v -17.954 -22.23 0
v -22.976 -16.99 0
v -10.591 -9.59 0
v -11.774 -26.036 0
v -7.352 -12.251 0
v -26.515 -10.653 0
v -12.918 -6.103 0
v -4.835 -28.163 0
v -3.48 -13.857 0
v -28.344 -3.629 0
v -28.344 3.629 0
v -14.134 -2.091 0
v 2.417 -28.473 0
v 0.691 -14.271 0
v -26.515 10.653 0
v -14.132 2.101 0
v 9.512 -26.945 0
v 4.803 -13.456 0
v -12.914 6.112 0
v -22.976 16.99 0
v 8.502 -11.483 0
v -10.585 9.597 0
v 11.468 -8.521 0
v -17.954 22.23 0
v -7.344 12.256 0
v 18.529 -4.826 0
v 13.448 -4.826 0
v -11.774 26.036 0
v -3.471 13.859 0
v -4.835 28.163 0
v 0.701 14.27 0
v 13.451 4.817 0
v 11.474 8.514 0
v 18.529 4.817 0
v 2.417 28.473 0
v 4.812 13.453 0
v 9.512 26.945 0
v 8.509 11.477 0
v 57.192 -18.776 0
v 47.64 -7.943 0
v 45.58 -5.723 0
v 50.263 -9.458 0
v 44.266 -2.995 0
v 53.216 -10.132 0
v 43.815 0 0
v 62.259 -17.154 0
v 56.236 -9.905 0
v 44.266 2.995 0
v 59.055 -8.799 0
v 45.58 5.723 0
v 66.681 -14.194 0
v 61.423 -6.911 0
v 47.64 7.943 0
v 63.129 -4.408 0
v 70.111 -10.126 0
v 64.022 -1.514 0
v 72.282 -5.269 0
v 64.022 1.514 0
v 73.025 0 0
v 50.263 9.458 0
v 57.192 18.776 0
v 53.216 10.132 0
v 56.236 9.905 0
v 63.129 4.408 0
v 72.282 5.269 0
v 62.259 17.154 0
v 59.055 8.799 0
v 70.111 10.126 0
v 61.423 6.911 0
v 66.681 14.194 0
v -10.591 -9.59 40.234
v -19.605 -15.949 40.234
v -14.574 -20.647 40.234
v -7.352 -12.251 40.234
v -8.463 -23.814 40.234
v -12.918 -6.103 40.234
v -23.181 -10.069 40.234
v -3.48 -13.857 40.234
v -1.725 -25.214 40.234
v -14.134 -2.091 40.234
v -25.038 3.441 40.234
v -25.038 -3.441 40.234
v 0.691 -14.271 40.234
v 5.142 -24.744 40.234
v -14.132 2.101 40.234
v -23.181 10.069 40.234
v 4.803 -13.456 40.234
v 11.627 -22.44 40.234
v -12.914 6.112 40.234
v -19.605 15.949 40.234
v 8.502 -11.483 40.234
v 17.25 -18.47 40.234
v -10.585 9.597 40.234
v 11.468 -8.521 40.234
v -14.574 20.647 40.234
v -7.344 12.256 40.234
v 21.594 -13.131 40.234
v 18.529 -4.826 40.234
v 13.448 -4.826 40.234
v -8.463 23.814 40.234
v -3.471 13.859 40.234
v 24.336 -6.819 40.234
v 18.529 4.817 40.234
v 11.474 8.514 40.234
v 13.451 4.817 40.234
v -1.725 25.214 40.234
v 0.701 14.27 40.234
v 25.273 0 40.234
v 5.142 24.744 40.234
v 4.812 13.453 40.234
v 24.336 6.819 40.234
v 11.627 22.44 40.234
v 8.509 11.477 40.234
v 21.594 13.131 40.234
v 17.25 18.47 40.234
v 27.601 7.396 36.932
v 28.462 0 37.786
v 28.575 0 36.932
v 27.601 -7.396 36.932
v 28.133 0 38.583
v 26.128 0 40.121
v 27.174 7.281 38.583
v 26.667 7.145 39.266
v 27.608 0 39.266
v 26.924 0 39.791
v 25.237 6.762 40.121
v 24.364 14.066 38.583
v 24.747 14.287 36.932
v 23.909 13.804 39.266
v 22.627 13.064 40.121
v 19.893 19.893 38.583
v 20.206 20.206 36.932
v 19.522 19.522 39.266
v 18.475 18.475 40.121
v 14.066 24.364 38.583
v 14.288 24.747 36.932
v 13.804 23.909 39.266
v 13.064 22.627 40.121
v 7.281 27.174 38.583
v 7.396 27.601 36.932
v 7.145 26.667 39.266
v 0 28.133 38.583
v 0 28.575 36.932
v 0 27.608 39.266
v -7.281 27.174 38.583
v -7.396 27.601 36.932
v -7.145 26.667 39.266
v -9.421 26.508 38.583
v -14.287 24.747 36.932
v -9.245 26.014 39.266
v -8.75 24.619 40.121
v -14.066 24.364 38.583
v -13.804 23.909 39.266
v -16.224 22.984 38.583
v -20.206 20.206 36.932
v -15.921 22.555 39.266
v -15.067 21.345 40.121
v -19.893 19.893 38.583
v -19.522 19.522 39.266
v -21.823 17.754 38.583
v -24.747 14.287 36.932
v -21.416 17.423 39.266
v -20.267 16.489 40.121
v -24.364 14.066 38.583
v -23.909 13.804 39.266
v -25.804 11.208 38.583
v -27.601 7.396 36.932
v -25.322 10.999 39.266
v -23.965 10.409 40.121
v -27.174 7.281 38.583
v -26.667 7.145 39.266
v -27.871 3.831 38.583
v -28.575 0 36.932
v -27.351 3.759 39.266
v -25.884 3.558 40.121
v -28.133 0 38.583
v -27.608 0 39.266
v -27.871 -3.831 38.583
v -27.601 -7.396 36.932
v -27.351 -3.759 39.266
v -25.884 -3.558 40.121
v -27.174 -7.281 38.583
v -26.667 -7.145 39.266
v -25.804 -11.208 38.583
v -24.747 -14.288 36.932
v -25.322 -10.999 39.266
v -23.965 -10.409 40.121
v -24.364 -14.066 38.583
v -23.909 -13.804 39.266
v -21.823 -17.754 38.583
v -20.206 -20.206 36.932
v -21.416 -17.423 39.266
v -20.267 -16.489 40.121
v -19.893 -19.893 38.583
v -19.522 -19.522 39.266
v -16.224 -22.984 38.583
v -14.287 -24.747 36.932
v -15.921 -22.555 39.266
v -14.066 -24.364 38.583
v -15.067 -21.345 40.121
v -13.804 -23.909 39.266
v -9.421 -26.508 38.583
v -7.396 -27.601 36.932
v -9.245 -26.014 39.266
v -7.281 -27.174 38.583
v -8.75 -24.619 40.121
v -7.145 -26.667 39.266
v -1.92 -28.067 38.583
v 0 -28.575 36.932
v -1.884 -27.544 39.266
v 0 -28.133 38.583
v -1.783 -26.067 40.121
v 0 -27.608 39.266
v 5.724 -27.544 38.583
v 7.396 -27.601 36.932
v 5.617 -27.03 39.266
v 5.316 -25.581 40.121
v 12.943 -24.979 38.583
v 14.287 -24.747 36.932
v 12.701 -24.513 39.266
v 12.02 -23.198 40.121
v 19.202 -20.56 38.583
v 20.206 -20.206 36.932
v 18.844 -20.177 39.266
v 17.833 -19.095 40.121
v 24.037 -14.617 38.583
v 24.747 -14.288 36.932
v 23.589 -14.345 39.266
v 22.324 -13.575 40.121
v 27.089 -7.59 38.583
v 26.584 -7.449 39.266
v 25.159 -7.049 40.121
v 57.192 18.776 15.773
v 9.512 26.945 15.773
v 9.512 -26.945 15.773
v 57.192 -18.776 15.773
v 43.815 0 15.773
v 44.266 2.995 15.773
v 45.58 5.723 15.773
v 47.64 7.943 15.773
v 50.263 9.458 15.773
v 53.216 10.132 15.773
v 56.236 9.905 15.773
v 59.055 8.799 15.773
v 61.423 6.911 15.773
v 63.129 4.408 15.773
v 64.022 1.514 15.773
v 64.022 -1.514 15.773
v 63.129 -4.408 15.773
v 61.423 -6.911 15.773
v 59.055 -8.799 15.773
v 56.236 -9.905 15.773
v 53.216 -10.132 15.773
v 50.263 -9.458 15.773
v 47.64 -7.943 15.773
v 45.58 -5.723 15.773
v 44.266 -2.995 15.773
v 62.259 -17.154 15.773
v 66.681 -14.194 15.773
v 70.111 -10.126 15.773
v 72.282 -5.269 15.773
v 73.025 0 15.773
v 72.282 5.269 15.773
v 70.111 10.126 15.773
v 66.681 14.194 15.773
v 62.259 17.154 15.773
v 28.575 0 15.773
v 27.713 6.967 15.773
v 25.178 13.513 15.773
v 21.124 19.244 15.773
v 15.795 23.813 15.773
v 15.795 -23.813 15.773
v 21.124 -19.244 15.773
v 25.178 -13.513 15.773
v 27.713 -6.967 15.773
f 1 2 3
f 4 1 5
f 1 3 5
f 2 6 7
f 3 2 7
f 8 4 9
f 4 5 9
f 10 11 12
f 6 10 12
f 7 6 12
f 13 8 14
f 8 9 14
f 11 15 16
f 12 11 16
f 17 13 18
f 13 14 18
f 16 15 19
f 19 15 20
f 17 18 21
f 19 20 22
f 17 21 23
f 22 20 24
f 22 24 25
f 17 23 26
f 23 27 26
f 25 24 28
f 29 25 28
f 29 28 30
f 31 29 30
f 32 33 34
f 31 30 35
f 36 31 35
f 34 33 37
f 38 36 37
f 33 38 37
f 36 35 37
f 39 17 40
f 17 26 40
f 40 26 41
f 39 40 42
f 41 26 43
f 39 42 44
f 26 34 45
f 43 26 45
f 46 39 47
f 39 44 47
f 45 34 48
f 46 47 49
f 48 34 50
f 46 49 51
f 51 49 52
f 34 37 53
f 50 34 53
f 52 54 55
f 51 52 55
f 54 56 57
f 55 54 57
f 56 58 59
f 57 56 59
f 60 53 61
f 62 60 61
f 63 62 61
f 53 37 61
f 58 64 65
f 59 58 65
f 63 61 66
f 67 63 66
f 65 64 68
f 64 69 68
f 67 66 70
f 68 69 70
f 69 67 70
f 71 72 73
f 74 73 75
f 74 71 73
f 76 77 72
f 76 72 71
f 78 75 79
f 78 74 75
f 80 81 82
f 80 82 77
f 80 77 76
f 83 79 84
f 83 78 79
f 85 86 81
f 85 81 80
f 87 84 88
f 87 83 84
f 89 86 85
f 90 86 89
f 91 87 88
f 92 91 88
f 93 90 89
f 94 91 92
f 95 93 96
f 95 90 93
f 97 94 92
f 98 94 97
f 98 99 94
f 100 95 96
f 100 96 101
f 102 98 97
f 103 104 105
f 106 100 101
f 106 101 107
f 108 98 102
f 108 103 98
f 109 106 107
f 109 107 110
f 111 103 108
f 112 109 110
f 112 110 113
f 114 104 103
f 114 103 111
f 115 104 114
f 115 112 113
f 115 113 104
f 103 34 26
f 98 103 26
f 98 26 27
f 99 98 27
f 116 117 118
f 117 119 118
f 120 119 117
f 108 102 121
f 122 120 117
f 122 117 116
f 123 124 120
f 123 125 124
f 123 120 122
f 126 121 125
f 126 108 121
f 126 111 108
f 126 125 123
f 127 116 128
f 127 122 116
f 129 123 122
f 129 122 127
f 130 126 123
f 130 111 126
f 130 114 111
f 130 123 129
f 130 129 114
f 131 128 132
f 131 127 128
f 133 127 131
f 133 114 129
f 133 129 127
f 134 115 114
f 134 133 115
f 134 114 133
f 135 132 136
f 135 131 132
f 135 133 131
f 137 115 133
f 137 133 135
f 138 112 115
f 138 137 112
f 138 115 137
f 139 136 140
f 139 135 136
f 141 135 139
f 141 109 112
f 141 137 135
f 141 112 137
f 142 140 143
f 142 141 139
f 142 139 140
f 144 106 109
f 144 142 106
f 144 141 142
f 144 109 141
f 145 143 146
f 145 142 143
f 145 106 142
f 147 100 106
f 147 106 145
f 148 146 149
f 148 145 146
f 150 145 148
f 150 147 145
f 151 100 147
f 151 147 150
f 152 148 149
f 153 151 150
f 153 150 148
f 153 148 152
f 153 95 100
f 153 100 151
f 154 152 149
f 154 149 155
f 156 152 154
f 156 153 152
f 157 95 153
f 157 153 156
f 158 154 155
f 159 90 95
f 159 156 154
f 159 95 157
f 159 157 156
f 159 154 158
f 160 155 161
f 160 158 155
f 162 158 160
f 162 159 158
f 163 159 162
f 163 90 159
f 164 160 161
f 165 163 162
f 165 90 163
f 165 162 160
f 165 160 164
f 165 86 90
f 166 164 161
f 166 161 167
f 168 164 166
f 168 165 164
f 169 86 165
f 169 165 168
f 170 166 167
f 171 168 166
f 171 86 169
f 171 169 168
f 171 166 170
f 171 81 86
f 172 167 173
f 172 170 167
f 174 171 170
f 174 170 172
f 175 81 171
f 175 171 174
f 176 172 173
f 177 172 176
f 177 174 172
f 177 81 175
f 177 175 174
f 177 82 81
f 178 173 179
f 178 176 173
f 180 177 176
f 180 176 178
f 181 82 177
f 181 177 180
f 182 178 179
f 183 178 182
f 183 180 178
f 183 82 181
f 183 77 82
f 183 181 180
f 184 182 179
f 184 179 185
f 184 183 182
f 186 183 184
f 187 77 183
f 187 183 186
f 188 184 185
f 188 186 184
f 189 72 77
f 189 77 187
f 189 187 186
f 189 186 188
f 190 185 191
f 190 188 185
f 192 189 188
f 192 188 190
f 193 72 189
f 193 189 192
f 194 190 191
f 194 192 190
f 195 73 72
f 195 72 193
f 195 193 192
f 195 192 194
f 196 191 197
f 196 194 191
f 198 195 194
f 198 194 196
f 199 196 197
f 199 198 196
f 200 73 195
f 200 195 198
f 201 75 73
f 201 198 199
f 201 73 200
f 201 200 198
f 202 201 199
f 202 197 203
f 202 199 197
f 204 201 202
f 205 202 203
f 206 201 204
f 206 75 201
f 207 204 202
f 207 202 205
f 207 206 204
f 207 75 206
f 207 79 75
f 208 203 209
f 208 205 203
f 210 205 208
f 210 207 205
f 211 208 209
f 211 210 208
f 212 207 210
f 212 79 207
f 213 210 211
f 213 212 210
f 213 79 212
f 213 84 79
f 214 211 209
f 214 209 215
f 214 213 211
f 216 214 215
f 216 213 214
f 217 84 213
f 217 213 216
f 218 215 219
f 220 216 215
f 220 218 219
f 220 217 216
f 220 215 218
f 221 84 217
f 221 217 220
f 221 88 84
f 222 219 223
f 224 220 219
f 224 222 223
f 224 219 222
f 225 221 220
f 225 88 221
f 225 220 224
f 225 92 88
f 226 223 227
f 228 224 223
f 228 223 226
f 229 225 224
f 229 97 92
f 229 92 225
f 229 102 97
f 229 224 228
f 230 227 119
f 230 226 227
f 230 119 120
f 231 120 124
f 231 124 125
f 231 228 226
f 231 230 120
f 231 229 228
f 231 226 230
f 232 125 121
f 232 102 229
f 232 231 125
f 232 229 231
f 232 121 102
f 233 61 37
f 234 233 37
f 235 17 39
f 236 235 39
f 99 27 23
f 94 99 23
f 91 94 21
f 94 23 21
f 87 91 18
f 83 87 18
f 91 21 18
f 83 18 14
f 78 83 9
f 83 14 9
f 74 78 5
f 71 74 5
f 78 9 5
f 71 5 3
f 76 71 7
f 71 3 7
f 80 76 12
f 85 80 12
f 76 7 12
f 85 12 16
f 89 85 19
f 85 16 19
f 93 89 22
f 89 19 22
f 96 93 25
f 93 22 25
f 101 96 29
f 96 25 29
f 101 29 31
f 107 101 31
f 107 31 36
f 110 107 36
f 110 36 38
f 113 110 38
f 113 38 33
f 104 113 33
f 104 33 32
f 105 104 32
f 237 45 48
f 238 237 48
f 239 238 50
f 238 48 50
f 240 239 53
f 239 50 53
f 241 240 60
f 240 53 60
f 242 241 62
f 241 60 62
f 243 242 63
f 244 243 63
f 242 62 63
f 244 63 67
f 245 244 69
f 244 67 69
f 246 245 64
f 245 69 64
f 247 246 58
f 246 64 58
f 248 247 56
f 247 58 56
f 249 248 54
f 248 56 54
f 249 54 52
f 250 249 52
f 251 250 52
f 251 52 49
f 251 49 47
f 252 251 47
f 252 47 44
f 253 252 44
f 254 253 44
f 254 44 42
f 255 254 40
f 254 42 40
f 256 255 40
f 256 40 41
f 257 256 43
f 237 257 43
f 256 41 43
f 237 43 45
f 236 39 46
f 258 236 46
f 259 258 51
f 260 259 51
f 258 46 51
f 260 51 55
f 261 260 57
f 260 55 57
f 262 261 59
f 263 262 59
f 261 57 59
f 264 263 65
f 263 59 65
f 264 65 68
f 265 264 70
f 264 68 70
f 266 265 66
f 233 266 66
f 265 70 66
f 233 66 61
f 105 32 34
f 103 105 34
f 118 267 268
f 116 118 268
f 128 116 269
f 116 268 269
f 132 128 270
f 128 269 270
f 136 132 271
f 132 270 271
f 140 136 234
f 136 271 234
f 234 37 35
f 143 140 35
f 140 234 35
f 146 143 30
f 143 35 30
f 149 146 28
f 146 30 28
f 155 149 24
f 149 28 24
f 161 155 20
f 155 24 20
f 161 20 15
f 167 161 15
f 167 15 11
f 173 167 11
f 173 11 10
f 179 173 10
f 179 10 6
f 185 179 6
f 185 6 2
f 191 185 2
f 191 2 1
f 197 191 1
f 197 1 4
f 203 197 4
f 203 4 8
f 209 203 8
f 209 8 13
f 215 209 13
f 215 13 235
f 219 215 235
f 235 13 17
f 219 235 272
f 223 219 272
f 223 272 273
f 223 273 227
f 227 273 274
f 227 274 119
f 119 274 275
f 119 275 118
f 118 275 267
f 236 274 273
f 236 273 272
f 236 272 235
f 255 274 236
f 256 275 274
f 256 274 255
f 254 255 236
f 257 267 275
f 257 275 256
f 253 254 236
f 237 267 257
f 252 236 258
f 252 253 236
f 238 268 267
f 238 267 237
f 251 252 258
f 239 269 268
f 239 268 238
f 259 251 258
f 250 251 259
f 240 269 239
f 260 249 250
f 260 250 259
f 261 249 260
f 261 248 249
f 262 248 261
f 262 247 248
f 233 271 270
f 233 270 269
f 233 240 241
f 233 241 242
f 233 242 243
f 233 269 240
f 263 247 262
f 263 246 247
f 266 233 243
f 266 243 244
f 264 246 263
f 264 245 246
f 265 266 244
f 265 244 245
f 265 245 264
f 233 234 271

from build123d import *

# Parameters (mm, degrees)
F1_DEPTH = 15.7734
F2_R     = 28.575
F3_DEPTH = 40.2336
F4_R     = 3.302


with BuildPart() as f1:
    # F0 (on Top) → F1 (new body)
    with BuildSketch(Plane.XY):
        with BuildLine():
            ThreePointArc((28.575, 0), (23.3274655355, -16.5033322905), (9.5121844836, -26.9452959039))
            Line((9.5121844836, -26.9452959039), (57.1919272622, -18.7764181619))
            ThreePointArc((57.1919272622, -18.7764181619), (73.025, 0), (57.1919272622, 18.7764181619))
            Line((57.1919272622, 18.7764181619), (9.5121844836, 26.9452959039))
            ThreePointArc((9.5121844836, 26.9452959039), (23.3274655355, 16.5033322905), (28.575, 0))
        make_face()
        with BuildLine():
            ThreePointArc((64.135, 0), (53.975, -10.16), (43.815, 0))
            ThreePointArc((43.815, 0), (53.975, 10.16), (64.135, 0))
        make_face(mode=Mode.SUBTRACT)
    extrude(amount=F1_DEPTH)

    # F2 (on Top) → F3 (join)
    with BuildSketch(Plane.XY):
        Circle(F2_R)
        with BuildLine():
            ThreePointArc((13.4477648793, -4.826), (-14.2874992271, 0.0046994463), (13.4509367064, 4.8171524752))
            Line((13.4509367064, 4.8171524752), (18.5293, 4.8171524752))
            Line((18.5293, 4.8171524752), (18.5293, 0))
            Line((18.5293, 0), (18.5293, -4.826))
            Line((18.5293, -4.826), (13.4477648793, -4.826))
        make_face(mode=Mode.SUBTRACT)
    extrude(amount=F3_DEPTH)

    # F4
    f4_edges = [f1.edges().sort_by_distance(p)[0] for p in [
        (-28.575, 0, 40.2336),
    ]]
    fillet(f4_edges, radius=F4_R)


solid = f1.part
